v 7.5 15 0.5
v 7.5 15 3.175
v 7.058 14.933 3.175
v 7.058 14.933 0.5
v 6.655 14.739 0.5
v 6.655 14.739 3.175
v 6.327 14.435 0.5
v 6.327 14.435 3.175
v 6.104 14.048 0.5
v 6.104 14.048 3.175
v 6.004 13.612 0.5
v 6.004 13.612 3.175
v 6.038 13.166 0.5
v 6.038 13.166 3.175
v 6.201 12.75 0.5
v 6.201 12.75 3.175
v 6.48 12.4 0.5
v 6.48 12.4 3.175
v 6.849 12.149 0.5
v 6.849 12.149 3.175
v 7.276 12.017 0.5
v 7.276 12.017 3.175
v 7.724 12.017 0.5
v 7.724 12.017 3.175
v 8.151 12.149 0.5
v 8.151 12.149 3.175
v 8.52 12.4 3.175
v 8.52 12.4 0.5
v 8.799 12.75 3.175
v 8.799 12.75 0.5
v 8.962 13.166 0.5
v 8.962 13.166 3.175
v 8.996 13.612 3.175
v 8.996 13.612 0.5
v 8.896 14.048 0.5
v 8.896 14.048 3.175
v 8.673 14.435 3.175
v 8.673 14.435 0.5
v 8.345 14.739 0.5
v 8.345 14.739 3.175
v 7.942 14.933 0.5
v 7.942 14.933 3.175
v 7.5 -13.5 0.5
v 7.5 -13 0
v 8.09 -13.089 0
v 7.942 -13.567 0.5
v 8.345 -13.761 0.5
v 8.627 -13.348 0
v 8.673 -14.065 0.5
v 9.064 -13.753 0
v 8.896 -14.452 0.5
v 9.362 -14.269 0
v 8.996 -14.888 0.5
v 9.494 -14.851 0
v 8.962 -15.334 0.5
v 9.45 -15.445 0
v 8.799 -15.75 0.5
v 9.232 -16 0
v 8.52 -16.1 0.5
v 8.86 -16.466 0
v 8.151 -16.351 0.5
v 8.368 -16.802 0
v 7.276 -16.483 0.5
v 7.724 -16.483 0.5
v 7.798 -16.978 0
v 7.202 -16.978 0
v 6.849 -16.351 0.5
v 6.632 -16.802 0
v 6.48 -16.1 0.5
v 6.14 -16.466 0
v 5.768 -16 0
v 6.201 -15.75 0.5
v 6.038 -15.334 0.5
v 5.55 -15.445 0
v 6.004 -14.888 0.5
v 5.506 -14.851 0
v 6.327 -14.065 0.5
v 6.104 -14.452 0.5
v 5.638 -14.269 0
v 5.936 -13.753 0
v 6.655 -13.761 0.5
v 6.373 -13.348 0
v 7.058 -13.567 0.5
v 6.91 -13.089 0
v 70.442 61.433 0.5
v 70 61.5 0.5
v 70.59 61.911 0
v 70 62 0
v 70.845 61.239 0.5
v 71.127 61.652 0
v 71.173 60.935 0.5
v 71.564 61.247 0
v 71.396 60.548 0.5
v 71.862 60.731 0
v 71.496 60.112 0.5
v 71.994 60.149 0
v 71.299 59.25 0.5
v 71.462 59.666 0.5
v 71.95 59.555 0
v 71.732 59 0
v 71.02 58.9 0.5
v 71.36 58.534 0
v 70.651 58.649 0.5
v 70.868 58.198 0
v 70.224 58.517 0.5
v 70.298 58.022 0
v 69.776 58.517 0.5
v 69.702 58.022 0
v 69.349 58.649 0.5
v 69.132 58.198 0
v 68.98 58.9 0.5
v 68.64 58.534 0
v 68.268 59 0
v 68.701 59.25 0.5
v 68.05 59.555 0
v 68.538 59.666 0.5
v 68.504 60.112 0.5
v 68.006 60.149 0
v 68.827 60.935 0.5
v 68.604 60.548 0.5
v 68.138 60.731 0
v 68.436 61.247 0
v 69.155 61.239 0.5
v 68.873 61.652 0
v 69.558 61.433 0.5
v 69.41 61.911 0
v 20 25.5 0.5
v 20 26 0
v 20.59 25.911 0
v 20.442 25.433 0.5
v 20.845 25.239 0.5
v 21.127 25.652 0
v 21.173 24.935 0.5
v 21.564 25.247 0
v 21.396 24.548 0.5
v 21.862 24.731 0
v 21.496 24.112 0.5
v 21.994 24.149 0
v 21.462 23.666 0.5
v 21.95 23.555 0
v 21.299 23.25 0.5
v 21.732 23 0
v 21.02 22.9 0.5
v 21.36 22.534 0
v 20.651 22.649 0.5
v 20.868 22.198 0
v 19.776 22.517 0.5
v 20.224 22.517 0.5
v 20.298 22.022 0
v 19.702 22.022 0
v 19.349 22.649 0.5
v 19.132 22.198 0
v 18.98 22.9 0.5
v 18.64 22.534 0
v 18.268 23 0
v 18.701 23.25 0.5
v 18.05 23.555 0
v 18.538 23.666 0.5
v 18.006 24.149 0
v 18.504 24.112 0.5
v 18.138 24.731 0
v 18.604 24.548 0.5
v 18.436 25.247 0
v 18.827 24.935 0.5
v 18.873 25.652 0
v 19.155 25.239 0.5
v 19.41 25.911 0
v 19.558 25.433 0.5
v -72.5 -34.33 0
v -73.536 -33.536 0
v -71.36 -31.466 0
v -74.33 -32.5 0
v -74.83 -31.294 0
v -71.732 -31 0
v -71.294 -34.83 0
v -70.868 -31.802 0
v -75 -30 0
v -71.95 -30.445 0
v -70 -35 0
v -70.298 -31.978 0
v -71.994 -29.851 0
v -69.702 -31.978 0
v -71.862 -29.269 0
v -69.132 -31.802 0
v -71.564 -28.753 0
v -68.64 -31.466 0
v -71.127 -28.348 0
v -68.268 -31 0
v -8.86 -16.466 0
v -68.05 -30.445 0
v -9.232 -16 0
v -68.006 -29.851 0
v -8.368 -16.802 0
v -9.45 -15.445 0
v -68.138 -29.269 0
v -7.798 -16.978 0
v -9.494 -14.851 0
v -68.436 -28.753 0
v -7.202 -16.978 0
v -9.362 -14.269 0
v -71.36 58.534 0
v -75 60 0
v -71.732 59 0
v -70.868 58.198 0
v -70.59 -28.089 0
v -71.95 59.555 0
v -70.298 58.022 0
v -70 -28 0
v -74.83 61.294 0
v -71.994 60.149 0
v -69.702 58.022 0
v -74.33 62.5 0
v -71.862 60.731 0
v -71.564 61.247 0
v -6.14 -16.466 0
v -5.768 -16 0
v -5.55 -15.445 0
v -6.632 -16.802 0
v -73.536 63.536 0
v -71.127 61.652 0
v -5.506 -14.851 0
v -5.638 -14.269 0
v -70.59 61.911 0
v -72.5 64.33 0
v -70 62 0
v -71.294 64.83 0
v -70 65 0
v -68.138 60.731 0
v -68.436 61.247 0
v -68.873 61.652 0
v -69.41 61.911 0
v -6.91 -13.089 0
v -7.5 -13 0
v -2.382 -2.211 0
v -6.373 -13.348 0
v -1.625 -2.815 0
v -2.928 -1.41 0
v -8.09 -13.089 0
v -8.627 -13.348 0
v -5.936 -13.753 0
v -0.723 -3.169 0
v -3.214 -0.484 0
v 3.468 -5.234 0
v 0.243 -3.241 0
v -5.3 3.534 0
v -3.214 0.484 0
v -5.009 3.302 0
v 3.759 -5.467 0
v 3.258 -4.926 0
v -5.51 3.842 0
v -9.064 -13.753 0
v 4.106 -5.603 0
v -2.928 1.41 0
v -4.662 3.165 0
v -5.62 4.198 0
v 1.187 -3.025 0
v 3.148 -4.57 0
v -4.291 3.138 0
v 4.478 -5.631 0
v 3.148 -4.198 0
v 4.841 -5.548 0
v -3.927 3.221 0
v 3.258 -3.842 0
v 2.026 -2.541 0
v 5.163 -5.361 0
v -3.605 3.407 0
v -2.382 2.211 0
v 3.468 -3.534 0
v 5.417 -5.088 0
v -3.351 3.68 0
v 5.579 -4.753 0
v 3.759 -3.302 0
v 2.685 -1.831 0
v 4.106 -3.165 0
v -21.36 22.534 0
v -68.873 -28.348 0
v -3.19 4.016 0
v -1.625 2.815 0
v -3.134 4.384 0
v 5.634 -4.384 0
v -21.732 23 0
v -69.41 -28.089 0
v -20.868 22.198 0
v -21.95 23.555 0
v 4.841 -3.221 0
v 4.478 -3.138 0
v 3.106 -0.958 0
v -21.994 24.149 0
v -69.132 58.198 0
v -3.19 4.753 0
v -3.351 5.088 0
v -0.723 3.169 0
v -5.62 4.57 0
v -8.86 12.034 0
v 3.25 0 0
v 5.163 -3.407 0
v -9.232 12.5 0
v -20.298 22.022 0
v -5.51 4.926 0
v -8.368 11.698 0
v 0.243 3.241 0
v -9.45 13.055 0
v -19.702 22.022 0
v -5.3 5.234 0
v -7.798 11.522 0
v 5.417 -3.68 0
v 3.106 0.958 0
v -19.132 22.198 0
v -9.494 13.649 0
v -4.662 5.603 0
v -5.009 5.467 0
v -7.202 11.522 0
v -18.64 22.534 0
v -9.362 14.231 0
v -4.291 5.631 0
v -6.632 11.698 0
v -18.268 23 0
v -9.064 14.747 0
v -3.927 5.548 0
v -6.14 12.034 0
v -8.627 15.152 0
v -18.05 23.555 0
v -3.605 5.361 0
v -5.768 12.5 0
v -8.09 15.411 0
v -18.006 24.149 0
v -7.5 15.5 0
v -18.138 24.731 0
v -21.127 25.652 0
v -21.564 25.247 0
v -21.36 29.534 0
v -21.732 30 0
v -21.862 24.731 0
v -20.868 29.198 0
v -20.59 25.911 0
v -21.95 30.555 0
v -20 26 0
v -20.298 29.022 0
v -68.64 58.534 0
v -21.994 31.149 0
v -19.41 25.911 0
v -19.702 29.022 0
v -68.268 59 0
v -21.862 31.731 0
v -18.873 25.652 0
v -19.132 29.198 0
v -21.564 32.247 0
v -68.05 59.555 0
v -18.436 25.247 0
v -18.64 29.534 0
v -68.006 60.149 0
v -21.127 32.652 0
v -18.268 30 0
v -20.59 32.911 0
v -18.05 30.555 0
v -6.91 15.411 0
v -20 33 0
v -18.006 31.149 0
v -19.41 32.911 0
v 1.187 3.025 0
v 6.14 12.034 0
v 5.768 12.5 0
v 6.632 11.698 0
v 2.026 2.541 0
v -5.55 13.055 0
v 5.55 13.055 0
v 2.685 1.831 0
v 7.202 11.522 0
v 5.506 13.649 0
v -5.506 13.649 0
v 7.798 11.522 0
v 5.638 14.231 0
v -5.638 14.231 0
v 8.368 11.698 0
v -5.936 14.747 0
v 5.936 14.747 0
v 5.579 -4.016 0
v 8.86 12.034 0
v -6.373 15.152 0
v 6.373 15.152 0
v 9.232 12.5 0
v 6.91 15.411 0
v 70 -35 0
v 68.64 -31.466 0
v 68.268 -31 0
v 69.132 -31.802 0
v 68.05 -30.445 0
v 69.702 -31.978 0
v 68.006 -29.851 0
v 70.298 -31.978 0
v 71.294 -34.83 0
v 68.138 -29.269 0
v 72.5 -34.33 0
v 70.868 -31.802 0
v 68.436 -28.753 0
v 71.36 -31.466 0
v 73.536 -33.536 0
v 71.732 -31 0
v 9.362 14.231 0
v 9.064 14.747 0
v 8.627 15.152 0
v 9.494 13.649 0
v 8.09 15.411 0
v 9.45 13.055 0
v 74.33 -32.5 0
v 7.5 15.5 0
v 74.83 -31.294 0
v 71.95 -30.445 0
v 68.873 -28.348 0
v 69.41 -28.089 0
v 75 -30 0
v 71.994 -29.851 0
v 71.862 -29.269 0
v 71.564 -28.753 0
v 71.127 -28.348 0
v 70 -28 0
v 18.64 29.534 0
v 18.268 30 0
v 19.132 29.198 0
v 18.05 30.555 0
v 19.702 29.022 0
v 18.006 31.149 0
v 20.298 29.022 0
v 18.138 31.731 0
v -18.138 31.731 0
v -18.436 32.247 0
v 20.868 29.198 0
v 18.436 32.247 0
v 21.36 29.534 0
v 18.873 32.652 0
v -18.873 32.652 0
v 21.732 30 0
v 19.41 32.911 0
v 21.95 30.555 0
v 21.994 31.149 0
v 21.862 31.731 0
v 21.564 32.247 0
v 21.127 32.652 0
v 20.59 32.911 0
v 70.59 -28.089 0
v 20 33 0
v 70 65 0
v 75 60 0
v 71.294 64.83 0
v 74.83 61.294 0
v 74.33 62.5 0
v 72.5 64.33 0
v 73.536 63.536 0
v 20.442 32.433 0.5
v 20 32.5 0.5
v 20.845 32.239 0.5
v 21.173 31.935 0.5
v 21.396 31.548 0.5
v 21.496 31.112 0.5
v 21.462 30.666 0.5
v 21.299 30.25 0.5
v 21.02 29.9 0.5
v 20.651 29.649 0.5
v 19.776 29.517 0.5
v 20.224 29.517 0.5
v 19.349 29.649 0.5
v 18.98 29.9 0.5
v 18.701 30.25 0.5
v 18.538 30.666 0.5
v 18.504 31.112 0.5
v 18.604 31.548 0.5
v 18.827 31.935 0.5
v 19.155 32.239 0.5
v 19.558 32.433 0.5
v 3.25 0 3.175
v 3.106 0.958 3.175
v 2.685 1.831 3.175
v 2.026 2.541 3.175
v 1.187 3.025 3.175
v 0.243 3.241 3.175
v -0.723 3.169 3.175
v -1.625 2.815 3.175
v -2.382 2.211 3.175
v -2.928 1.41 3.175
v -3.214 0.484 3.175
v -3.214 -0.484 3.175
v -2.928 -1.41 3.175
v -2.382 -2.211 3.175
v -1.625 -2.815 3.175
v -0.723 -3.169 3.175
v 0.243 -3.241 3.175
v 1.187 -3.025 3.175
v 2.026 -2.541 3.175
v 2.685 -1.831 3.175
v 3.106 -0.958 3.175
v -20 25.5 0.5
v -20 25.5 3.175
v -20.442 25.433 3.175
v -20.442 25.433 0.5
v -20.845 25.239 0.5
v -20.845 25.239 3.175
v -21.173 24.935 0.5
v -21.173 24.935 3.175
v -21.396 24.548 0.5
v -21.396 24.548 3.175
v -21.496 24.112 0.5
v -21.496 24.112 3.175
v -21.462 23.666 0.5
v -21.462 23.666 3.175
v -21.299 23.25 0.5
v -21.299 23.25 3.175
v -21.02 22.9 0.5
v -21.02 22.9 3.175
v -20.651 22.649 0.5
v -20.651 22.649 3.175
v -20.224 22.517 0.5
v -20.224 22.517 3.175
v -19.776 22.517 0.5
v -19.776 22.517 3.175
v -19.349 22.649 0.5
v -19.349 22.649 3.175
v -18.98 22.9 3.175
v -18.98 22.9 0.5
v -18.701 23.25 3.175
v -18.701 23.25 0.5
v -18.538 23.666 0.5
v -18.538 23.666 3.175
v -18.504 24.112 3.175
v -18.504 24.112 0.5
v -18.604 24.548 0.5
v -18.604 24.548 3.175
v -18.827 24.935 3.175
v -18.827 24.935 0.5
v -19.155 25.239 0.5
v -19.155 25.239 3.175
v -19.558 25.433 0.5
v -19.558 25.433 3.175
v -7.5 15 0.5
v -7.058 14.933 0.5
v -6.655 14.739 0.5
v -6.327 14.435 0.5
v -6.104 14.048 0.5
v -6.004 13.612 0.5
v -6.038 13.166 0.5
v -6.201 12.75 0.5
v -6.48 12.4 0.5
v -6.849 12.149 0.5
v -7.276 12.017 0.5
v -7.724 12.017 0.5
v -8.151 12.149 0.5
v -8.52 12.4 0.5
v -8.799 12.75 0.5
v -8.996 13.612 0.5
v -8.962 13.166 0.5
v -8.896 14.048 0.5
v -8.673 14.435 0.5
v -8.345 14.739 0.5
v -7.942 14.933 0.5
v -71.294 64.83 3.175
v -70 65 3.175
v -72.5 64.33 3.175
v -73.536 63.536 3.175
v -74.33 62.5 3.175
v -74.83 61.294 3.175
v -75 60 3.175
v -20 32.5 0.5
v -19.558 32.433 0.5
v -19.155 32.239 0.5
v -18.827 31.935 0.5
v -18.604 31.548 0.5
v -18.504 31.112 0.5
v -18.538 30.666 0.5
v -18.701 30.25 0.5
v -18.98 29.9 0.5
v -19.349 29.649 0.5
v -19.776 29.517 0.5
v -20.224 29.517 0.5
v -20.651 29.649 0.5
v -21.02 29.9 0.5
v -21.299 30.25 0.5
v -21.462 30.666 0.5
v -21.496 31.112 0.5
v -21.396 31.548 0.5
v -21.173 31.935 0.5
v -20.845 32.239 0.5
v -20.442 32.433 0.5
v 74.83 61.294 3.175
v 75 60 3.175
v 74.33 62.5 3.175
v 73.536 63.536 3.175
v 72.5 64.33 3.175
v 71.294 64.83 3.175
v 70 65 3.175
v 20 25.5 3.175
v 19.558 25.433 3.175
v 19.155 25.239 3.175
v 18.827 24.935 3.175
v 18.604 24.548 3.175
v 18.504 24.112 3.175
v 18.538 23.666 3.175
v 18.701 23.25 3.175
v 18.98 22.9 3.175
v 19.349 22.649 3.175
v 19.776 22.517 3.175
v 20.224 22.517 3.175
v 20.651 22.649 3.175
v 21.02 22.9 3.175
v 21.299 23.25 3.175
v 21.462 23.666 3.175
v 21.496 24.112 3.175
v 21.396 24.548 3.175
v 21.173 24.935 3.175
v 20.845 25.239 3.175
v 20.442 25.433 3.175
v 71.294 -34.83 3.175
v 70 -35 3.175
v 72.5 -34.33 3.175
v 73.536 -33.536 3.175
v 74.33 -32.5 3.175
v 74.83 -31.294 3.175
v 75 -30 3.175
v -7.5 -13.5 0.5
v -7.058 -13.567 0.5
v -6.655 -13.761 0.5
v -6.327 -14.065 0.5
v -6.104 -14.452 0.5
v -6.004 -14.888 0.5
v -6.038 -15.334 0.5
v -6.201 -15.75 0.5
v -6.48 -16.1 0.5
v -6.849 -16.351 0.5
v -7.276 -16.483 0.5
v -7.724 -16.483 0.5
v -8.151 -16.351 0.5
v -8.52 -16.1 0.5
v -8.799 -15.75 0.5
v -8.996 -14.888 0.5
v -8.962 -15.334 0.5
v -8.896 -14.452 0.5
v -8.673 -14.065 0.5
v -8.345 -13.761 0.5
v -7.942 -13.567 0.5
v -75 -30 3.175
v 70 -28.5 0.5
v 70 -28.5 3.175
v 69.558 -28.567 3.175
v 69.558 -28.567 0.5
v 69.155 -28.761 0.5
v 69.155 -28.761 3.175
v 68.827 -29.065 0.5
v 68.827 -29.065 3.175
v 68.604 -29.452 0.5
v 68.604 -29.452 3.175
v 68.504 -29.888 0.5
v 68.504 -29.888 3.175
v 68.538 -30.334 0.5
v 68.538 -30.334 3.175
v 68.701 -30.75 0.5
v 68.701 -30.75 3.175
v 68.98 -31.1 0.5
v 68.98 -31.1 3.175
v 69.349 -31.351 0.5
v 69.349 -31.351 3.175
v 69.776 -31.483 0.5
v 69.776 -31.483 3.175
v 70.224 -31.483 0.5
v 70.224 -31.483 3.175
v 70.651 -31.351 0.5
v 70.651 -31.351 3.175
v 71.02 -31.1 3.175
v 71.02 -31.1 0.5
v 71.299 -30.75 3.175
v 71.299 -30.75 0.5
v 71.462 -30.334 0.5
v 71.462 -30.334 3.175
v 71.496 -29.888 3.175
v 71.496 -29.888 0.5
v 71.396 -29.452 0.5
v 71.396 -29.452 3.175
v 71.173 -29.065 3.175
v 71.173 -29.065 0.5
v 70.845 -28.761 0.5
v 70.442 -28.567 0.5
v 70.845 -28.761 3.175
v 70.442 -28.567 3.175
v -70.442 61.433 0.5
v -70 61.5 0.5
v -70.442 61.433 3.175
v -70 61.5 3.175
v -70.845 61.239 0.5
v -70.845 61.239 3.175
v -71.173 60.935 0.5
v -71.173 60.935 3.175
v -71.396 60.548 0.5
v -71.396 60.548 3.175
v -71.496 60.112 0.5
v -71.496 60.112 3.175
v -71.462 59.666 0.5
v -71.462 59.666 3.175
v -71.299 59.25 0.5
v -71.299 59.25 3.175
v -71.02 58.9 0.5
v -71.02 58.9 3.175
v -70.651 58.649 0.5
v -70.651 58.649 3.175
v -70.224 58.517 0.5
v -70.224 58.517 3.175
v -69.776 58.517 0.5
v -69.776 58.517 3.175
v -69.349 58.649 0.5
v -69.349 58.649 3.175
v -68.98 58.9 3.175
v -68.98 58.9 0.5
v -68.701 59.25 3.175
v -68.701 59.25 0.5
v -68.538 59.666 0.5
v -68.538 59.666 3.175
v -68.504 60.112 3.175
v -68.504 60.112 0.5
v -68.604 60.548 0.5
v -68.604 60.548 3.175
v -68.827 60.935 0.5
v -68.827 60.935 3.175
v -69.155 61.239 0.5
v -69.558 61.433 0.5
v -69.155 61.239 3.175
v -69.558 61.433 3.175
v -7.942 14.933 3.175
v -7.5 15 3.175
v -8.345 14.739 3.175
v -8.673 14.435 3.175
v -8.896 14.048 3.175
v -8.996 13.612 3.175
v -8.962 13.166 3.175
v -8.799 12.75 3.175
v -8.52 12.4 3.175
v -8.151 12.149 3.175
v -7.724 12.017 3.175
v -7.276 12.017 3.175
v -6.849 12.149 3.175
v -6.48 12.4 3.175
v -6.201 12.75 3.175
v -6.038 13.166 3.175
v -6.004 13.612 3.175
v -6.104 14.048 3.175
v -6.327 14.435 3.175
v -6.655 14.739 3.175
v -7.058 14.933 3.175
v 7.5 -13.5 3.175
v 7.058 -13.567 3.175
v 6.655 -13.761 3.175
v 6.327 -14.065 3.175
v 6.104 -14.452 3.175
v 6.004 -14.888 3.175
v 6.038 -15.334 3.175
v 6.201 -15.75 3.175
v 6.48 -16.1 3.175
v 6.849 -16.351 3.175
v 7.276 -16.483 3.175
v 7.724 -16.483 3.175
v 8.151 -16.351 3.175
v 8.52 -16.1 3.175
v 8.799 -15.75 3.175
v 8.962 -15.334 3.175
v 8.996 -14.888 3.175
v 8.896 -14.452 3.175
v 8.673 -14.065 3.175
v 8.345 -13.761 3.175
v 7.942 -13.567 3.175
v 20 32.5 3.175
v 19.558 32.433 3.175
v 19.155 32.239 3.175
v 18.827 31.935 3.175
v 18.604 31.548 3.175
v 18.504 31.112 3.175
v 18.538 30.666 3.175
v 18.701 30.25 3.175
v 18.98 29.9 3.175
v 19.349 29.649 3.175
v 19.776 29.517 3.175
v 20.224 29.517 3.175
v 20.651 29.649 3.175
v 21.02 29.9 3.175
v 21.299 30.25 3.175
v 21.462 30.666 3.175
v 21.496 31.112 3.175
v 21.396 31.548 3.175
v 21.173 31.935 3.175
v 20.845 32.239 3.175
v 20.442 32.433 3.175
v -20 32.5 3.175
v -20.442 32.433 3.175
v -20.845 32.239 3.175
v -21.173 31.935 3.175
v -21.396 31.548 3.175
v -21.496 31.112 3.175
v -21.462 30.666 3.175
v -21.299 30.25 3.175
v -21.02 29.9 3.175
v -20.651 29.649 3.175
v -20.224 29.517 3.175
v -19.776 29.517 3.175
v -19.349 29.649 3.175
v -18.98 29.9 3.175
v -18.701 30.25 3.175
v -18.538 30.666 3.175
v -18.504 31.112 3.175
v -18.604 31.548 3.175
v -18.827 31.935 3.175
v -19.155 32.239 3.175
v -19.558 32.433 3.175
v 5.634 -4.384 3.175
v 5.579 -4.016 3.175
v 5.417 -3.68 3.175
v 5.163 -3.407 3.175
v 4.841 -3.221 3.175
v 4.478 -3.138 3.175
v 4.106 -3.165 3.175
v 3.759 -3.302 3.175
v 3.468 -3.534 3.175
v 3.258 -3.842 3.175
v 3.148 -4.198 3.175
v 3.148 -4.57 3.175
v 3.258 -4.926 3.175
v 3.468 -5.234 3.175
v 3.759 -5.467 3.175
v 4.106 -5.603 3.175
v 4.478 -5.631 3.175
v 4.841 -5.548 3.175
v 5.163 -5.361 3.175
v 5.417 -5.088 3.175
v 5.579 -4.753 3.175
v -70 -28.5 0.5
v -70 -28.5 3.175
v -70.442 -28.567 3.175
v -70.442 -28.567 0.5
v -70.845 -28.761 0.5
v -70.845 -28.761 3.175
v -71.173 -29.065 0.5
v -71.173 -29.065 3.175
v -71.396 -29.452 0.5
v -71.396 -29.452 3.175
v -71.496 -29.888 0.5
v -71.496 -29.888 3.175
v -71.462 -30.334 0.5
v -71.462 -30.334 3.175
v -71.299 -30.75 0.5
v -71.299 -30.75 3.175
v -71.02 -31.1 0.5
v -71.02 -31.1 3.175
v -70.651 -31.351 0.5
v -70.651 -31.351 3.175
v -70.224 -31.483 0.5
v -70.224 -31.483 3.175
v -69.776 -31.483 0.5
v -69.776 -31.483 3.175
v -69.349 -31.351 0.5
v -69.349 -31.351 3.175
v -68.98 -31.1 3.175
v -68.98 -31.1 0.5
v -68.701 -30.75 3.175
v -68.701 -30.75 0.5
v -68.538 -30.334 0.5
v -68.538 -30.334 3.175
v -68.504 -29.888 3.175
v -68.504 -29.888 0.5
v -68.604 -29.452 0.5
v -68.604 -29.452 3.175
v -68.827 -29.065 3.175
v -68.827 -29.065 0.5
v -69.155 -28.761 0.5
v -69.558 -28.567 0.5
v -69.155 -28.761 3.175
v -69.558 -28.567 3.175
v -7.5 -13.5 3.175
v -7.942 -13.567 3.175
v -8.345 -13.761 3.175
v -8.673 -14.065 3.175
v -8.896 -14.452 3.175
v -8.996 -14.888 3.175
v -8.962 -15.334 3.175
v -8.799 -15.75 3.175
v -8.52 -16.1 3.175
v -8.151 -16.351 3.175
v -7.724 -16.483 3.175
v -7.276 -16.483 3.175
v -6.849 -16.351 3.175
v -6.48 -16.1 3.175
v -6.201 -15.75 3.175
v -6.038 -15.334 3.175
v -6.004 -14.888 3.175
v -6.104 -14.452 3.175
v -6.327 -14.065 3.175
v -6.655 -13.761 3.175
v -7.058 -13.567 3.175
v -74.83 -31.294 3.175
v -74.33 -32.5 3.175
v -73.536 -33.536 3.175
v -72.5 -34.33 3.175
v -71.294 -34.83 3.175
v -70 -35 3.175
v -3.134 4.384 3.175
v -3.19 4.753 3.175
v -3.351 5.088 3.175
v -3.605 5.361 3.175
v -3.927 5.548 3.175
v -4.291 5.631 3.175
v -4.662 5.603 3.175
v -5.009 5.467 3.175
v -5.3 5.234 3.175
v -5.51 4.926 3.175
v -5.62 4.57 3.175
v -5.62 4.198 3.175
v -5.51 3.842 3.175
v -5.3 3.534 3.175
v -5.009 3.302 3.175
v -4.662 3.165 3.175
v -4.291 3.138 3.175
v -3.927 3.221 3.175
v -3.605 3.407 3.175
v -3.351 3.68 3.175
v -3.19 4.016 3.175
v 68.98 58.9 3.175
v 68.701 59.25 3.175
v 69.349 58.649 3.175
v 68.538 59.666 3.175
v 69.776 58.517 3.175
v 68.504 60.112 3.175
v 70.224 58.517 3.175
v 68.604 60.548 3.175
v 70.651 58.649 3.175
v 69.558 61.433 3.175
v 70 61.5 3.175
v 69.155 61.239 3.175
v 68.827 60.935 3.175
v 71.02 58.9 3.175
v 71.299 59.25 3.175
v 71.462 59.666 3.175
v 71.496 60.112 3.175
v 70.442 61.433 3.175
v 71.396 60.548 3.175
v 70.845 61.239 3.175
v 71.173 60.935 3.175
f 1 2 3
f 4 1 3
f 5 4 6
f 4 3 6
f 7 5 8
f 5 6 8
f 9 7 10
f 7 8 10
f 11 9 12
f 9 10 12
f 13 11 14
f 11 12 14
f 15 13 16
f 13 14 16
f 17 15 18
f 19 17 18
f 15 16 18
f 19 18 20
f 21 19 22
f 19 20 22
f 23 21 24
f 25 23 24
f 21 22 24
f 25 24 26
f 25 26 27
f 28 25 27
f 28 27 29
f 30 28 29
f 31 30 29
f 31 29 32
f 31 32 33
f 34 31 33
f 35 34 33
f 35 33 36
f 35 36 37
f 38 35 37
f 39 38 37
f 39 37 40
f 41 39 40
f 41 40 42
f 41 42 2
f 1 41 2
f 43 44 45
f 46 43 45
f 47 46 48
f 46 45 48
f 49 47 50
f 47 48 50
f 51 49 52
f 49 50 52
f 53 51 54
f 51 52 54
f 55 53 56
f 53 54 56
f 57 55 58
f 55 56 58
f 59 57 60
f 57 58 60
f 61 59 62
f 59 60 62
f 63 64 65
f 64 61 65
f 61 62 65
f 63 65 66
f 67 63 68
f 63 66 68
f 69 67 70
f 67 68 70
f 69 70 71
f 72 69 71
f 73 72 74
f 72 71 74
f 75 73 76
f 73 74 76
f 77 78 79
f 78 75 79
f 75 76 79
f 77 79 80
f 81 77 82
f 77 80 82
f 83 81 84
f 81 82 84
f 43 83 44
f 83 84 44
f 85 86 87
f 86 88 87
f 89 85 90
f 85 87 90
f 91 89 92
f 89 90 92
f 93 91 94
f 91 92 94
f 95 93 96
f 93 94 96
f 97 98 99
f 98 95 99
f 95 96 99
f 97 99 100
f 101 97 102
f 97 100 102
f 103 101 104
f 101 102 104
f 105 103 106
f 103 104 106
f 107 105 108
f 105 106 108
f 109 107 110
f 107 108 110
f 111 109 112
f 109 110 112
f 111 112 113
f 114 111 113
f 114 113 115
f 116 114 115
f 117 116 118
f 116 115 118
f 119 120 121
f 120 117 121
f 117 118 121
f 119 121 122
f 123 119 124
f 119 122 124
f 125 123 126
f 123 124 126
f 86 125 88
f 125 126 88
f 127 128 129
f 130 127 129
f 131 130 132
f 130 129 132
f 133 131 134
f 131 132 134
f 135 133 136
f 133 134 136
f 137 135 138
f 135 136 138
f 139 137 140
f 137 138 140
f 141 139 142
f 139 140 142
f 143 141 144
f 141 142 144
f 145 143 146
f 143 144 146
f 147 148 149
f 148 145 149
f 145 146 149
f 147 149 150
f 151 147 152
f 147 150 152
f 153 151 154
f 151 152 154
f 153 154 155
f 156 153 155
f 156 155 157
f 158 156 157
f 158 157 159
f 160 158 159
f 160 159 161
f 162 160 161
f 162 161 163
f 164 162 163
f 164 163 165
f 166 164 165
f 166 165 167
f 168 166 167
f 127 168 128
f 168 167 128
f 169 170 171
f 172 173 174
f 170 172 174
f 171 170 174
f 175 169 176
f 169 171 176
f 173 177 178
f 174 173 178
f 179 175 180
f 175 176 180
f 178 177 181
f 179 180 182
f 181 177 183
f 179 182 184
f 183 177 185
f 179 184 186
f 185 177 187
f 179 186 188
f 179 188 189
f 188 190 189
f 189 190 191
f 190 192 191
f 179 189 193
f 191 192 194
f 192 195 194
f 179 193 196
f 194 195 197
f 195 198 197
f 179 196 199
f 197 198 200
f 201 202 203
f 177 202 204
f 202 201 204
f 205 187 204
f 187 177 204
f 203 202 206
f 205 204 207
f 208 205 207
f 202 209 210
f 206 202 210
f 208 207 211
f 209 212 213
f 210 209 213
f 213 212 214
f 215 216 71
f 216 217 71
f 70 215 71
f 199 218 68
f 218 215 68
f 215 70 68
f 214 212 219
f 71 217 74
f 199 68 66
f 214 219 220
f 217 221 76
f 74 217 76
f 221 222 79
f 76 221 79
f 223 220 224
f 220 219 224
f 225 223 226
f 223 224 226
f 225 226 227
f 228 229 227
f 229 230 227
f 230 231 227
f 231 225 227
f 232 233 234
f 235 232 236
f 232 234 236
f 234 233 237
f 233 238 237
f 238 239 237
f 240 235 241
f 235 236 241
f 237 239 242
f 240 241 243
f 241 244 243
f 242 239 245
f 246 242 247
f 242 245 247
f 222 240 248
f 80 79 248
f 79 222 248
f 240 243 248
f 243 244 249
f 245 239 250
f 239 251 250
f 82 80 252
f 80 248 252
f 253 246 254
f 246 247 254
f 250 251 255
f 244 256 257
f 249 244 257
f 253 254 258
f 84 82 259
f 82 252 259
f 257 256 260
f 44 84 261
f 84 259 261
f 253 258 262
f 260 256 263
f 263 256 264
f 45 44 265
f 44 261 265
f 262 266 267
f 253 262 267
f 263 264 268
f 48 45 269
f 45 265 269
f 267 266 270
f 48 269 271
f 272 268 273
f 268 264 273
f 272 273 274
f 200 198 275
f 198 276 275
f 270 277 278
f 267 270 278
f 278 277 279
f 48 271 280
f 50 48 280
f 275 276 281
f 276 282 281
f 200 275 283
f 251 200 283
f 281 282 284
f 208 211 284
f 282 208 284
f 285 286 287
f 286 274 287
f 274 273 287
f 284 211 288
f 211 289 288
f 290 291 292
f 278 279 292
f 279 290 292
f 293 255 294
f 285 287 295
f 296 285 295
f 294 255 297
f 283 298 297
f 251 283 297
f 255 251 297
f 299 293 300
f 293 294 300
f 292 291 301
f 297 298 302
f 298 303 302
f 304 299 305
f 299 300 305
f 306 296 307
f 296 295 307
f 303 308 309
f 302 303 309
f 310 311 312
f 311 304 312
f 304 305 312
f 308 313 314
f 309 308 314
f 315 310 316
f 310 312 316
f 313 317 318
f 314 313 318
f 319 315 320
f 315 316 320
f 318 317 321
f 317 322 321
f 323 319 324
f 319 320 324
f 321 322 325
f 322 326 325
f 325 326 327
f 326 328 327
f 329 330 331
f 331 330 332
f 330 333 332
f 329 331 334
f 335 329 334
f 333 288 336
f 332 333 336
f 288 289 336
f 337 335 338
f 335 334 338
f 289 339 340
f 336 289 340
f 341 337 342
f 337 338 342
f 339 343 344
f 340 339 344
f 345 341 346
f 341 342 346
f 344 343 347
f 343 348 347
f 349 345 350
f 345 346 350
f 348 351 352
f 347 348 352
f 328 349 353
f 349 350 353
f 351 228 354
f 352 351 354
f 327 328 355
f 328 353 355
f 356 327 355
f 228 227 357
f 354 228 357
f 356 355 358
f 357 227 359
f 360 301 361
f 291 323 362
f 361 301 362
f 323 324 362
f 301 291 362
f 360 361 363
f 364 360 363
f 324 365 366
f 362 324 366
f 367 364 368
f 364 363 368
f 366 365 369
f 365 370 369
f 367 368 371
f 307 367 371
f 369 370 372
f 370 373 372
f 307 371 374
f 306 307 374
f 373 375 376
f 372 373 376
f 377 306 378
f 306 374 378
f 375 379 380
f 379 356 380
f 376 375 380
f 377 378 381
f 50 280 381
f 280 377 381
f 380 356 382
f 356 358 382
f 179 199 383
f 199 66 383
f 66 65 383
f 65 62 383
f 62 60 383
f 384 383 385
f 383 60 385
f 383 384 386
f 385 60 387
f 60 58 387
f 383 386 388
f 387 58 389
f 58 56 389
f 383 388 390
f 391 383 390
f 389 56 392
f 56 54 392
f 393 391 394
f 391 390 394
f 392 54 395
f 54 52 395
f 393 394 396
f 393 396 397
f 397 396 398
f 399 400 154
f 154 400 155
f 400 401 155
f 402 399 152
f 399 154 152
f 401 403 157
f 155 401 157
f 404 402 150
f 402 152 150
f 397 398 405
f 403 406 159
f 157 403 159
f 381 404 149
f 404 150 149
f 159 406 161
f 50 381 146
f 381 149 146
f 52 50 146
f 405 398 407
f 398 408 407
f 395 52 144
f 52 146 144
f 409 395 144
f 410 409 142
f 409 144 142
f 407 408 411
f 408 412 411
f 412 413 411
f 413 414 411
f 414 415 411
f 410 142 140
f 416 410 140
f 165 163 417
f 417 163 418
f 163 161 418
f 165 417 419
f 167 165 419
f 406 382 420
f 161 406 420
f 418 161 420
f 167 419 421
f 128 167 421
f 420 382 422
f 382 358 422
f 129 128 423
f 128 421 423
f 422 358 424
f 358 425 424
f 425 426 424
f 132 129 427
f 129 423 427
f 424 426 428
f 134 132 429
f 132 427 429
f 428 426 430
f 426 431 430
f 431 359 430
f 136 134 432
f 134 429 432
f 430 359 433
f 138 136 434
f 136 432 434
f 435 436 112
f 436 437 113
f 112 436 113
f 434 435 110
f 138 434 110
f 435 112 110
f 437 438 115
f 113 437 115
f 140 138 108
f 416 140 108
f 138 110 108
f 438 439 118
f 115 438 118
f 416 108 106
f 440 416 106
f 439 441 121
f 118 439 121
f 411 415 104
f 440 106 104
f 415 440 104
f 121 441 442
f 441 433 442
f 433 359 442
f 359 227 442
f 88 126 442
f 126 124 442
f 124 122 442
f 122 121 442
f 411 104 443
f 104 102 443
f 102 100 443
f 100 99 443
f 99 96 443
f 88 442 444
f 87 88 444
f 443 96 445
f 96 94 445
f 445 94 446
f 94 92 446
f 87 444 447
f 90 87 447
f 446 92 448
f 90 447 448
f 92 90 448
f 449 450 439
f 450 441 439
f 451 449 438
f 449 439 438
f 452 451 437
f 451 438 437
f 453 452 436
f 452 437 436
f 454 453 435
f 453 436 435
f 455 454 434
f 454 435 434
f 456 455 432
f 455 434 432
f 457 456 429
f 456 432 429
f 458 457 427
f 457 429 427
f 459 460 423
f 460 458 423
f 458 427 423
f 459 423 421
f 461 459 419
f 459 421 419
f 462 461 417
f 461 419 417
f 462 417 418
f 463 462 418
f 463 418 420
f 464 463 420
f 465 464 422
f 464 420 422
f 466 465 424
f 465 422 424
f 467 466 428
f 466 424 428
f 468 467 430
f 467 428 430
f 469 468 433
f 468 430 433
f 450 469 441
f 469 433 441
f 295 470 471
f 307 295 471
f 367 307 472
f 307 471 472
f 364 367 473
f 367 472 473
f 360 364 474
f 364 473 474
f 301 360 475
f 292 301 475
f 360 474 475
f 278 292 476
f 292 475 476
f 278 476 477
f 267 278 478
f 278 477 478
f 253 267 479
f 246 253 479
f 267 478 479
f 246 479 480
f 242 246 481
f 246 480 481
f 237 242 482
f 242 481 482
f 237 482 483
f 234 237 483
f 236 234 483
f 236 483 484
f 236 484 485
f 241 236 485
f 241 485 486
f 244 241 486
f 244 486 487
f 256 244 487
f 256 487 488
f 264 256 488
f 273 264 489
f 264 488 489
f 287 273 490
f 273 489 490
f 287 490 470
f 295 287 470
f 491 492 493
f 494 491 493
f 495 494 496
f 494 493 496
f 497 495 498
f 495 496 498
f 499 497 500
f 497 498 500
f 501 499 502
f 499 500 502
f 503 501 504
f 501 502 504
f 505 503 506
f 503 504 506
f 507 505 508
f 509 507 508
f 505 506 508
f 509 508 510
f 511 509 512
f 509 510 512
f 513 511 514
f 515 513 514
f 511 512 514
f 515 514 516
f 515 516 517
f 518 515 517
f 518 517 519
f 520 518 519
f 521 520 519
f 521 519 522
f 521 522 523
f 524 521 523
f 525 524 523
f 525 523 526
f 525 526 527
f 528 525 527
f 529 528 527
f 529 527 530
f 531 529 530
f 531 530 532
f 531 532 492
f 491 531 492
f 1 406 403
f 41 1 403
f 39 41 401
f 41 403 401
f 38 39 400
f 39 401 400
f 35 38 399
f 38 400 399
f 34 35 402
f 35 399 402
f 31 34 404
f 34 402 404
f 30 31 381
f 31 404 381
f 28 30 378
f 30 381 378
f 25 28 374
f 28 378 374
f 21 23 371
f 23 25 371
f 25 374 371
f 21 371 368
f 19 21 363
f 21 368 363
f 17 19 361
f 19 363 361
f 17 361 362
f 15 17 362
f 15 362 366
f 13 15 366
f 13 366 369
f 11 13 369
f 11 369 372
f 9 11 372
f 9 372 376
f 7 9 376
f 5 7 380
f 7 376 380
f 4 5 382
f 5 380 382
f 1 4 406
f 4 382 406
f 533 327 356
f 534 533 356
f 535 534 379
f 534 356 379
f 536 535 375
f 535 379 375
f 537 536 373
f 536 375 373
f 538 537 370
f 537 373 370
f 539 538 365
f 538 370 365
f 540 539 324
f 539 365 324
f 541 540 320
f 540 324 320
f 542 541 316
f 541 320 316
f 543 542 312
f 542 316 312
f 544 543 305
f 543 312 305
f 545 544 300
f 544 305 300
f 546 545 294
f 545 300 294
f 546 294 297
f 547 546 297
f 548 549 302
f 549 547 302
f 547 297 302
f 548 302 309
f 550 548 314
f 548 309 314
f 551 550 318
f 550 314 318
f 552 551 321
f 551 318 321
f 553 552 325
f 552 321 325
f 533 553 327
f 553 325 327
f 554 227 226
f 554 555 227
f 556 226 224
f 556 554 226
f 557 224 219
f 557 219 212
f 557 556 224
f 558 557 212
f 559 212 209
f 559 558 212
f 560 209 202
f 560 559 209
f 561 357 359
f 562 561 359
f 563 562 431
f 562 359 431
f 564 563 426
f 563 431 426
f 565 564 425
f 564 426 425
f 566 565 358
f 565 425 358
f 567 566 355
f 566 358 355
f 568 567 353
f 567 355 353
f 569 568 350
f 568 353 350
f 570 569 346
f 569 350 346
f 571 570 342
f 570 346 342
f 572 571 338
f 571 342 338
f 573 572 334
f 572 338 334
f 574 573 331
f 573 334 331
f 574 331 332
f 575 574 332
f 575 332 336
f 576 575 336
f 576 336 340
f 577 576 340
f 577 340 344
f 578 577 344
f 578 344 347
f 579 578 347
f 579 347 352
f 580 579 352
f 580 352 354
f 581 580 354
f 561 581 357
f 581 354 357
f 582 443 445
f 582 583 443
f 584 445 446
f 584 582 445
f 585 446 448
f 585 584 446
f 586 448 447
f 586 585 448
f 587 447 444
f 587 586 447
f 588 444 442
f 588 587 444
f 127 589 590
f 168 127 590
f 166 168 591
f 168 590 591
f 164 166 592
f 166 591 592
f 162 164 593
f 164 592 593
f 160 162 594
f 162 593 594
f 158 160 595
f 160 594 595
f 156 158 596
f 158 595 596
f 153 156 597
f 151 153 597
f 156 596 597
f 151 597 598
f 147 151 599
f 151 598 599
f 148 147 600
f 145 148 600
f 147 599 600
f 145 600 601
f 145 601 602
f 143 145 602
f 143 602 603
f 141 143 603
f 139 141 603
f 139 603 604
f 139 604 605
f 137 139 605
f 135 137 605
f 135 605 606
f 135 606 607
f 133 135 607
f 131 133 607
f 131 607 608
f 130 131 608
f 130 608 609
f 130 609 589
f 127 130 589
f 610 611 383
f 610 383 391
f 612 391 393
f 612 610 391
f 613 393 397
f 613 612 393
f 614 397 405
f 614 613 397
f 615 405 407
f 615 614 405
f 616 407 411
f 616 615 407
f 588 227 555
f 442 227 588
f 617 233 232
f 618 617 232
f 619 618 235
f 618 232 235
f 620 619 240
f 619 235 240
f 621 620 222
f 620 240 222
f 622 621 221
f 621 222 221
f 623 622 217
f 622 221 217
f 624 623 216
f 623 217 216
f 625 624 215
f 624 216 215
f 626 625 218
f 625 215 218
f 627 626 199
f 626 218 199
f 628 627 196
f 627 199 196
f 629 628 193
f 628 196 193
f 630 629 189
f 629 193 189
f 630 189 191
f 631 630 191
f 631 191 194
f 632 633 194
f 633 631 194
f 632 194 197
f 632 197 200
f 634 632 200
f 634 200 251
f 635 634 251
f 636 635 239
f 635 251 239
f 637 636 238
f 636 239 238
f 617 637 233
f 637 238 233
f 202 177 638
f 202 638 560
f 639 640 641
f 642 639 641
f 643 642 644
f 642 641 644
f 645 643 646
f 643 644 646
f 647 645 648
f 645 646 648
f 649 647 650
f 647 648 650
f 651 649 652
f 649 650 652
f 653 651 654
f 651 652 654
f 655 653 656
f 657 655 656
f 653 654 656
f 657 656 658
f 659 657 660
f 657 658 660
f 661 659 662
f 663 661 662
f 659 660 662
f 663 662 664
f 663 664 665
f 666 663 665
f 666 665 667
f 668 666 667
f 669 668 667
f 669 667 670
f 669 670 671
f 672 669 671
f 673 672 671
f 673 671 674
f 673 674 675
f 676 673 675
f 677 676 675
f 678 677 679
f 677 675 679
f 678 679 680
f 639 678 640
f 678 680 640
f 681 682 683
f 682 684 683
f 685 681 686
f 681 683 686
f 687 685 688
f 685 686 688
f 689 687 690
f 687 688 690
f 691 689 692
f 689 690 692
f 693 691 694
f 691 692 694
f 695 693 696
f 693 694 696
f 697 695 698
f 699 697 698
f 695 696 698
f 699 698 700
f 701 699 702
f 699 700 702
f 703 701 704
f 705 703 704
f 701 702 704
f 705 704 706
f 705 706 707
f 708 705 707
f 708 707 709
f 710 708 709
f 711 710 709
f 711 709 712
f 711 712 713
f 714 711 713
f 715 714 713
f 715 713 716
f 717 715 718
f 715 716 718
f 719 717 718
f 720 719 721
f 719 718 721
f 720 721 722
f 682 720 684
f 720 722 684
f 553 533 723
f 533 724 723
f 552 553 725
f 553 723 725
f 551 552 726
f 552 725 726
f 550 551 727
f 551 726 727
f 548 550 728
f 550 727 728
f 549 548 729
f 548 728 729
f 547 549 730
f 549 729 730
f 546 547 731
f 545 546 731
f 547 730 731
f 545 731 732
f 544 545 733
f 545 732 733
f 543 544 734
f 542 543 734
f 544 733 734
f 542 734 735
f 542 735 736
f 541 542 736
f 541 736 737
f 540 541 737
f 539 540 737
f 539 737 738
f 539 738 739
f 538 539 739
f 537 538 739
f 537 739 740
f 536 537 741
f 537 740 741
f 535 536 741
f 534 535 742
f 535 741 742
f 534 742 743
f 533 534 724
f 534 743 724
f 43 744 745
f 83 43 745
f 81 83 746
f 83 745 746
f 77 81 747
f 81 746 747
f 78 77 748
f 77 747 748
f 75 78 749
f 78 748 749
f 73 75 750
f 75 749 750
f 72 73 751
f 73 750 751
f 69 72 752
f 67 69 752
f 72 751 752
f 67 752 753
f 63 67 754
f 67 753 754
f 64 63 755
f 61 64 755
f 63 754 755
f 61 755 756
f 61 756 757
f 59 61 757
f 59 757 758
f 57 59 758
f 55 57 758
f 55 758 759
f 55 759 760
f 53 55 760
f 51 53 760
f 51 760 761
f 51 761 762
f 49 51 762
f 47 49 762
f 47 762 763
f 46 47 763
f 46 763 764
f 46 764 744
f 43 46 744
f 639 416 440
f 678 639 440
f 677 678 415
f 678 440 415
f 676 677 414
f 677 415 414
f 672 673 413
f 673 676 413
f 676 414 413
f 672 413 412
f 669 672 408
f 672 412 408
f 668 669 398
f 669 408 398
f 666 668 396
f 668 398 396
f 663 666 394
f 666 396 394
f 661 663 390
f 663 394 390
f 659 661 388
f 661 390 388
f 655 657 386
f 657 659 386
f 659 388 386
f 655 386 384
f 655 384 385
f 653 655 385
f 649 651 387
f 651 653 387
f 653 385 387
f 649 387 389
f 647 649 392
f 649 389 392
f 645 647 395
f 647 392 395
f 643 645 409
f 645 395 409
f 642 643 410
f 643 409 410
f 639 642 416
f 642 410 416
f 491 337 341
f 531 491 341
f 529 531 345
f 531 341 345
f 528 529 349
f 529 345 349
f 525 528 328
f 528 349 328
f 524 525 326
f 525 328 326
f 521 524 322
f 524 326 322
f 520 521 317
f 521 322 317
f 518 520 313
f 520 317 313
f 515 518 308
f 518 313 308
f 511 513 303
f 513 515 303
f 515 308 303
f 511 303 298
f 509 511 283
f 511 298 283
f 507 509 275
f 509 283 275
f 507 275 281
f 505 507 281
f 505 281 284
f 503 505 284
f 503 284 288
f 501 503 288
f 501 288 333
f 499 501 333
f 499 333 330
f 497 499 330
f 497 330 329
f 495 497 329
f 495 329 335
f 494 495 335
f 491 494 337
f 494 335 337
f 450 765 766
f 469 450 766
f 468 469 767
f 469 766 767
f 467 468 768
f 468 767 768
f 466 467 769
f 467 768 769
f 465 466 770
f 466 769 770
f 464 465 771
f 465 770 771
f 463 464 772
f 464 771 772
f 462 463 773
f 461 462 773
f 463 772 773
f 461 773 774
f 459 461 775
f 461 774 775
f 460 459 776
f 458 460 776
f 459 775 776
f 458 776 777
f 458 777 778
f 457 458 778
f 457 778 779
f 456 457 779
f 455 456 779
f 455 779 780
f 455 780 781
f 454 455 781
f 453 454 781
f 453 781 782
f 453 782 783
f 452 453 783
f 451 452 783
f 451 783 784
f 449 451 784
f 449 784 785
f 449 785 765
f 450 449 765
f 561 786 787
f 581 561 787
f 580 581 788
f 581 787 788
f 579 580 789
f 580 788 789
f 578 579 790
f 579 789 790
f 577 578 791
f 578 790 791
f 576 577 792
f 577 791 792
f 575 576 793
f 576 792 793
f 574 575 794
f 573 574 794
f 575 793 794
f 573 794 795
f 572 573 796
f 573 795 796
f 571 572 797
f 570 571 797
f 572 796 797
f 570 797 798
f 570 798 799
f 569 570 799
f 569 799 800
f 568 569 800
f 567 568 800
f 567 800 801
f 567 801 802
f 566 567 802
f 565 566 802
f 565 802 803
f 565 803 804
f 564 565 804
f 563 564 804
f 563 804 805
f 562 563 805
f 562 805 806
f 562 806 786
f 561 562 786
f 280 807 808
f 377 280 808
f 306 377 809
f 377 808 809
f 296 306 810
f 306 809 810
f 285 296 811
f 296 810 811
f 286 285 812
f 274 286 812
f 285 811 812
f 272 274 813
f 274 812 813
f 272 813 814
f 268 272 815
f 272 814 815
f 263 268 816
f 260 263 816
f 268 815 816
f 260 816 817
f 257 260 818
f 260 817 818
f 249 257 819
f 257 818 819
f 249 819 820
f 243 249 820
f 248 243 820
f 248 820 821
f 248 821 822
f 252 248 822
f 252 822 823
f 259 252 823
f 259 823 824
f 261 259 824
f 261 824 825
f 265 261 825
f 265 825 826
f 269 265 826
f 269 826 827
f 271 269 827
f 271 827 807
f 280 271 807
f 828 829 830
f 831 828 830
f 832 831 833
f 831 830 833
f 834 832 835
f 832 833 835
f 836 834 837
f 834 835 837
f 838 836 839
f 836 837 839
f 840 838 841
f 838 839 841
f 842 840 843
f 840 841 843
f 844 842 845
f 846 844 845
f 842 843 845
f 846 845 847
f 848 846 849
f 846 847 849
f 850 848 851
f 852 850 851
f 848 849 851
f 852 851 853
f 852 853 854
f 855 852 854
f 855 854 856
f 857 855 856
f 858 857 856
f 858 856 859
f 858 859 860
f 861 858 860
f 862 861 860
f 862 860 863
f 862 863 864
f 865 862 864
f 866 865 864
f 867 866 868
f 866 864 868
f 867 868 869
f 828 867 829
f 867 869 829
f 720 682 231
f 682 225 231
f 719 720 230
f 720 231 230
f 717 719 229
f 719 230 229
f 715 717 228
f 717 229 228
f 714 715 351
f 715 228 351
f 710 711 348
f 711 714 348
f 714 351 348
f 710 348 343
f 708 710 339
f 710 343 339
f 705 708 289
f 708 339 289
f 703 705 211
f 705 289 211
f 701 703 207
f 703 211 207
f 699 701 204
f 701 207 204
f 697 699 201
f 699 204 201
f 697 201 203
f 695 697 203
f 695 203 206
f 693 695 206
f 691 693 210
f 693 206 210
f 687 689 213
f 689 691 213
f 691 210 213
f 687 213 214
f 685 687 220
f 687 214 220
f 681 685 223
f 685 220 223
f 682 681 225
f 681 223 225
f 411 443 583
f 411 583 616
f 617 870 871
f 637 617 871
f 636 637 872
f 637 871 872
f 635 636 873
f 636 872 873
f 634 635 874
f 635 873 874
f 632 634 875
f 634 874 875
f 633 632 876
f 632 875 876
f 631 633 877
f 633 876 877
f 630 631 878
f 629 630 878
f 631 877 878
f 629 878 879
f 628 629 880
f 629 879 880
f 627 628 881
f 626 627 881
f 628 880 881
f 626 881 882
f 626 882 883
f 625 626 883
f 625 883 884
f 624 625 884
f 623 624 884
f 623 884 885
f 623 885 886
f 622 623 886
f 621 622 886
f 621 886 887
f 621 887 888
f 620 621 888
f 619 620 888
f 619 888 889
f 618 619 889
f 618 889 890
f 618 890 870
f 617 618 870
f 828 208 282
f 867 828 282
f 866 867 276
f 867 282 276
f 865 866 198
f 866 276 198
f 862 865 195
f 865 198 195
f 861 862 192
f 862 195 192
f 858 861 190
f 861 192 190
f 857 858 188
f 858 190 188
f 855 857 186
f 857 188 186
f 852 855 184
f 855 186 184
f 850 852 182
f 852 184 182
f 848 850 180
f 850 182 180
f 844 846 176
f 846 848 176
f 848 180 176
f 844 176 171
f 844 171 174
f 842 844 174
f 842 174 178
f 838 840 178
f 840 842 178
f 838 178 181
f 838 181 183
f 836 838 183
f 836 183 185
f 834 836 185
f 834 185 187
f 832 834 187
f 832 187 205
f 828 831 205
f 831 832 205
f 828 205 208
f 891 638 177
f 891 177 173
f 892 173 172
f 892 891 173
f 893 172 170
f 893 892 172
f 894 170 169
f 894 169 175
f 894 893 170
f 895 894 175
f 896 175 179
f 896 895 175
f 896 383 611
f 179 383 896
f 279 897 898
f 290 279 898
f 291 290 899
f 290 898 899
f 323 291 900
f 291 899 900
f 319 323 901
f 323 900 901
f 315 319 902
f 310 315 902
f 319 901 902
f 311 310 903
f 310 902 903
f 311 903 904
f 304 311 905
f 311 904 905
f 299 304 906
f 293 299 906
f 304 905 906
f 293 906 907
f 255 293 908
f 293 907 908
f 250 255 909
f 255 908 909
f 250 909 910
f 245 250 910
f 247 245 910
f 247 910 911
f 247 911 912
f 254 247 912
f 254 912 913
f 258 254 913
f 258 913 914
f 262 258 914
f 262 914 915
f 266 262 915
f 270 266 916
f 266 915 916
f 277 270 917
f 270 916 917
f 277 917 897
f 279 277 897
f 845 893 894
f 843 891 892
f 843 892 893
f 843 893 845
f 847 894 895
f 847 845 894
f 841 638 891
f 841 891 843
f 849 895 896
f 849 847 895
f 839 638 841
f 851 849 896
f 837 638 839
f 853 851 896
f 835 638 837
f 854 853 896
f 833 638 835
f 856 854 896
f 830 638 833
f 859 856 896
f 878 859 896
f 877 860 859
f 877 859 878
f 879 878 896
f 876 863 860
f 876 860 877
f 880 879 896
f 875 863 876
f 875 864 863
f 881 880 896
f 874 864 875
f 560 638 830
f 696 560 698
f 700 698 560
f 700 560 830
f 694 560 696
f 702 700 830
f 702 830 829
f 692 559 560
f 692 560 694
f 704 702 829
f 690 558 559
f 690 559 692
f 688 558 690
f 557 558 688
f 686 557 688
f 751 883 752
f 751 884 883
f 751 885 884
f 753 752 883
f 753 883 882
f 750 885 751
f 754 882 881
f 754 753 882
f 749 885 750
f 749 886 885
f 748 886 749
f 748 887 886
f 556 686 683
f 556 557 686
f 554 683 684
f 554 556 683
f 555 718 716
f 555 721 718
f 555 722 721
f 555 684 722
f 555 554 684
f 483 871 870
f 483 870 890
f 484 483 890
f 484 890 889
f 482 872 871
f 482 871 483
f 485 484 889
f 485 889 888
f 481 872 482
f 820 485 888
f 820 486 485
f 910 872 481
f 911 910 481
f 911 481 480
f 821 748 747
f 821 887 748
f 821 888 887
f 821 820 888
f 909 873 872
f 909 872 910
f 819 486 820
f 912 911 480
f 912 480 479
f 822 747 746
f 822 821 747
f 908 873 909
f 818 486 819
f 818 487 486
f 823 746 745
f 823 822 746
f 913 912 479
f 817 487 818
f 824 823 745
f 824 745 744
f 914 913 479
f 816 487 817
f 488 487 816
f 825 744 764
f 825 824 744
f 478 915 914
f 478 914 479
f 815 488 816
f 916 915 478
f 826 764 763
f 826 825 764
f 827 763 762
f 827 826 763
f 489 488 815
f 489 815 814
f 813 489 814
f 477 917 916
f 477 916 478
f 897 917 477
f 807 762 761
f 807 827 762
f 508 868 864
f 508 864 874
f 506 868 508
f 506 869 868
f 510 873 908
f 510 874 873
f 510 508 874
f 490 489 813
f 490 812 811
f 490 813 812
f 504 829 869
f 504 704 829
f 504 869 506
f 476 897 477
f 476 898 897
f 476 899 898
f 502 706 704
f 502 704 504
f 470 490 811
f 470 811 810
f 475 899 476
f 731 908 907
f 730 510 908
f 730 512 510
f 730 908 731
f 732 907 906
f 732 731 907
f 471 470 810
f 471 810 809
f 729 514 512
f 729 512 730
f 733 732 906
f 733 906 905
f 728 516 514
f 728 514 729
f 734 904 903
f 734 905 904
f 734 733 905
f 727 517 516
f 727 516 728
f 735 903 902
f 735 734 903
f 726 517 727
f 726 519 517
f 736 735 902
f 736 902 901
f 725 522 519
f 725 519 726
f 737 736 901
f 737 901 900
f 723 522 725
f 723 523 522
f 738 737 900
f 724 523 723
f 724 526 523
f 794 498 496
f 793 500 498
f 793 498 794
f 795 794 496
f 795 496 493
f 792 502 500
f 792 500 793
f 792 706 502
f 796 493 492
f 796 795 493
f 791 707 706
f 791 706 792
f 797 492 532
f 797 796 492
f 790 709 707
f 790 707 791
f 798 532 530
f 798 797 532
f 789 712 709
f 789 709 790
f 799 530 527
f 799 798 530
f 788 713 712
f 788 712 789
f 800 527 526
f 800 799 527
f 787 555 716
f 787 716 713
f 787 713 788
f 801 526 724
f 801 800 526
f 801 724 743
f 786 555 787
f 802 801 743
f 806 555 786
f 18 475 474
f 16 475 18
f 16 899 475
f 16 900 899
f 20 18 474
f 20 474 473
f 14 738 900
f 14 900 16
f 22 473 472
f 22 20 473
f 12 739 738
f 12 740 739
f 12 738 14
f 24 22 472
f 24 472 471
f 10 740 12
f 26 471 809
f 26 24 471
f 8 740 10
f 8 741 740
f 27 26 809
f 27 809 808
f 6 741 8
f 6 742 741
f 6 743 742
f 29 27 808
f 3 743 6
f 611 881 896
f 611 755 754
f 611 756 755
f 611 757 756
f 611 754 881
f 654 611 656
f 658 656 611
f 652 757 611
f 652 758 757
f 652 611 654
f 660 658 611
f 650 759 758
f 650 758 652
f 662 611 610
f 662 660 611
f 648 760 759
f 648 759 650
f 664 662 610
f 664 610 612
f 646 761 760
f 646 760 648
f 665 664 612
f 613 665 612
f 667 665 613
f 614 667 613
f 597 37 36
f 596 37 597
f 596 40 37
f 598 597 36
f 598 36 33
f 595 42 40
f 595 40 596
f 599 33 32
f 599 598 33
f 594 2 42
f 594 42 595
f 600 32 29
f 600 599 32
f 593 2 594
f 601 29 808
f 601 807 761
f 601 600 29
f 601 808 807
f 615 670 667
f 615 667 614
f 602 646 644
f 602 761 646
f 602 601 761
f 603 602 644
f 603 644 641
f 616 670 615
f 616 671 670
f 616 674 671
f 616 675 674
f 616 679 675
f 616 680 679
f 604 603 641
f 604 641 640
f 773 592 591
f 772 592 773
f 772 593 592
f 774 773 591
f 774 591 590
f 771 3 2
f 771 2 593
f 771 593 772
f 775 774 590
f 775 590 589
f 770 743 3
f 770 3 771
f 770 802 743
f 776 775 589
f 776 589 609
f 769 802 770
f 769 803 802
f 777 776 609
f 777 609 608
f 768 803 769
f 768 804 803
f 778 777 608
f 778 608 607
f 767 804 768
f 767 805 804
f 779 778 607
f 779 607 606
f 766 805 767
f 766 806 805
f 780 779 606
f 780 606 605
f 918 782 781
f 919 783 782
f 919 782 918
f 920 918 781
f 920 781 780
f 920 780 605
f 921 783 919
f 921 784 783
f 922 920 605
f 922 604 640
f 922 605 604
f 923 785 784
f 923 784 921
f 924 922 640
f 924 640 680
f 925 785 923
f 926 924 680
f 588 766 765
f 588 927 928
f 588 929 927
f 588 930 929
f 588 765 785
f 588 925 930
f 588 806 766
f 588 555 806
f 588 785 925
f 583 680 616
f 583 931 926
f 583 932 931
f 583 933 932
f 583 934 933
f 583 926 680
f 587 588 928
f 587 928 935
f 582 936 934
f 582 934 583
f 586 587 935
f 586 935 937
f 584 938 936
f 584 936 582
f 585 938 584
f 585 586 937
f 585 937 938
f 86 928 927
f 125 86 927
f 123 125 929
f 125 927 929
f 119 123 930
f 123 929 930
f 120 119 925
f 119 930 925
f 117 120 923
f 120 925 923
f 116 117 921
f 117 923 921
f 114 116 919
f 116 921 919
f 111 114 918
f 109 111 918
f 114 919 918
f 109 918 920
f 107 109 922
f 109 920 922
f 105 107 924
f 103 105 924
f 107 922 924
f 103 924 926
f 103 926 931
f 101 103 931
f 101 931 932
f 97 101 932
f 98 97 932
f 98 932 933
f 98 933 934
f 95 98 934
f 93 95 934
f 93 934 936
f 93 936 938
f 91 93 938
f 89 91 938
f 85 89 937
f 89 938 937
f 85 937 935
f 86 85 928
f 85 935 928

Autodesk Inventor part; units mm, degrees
ref_plane "YZ Plane" through (0, 0, 0) normal (1, 0, 0) x (0, 1, 0)
ref_plane "XZ Plane" through (0, 0, 0) normal (0, 1, 0) x (-1, 0, 0)
ref_plane "XY Plane" through (0, 0, 0) normal (0, 0, 1) x (1, 0, 0)
sketch "Sketch1" plane through (0, 0, 0) normal (0, 0, 1) x (1, 0, 0)
  line L0 (-75, 65) -> (75, 65)
  line L1 (75, 65) -> (75, -35)
  line L2 (75, -35) -> (-75, -35)
  line L3 (-75, -35) -> (-75, 65)
  point P0 (0, 0)
  dimension "d0" = 150
  dimension "d1" = 100
  dimension "d29" = 65
  dimension "d30" = 75
extrude "Extrusion1" add sketch "Sketch1" along normal blind 3.175
sketch "Sketch2" plane through (0, 0, 0) normal (0, 0, 1) x (1, 0, 0)
  line L0 (75, 65) -> (-75, 65) projected
  line L1 (-75, 65) -> (-75, -35) projected
  line L2 (75, -35) -> (75, 65) projected
  line L3 (-75, -35) -> (75, -35) projected
  point P0 (0, 0)
  point P1 (-70, 60)
  point P2 (70, 60)
  point P3 (70, -30)
  point P4 (-70, -30)
  dimension "d4" = 5
  dimension "d5" = 5
  dimension "d6" = 5
  dimension "d7" = 5
  dimension "d8" = 5
  dimension "d9" = 5
  dimension "d10" = 5
  dimension "d11" = 5
hole "Hole1" at (-70, 60, 0) at (70, 60, 0) at (70, -30, 0) at (-70, -30, 0) direction (0, 0, 1) diameter 3 end through all countersink diameter 4 countersink angle 90
fillet "Fillet1" radius 5 4 edges at (-75, 65, 1.5875) (75, 65, 1.5875) (75, -35, 1.5875) (-75, -35, 1.5875)
sketch "Sketch3" plane through (0, 0, 3.175) normal (0, 0, 1) x (1, 0, 0)
  circle A0 centre (0, 0) radius 3.25
  circle A1 centre (4.3841, -4.3841) radius 1.25
  circle A2 centre (-4.3841, 4.3841) radius 1.25
  dimension "d20" = 2.5
  dimension "d21" = 2.5
  dimension "d22" = 6.5
  dimension "d25" = 8.7681
  dimension "d26" = 8.7681
  dimension "d27" = 4.3841
  dimension "d28" = 4.3841
extrude "Extrusion2" cut sketch "Sketch3" against normal up to next
sketch "Sketch4" plane through (0, 0, 0) normal (0, 0, -1) x (-1, 0, 0)
  point P0 (0, 0)
  point P1 (-7.5, 13.5)
  point P2 (7.5, 13.5)
  point P3 (7.5, -15)
  point P4 (-7.5, -15)
  dimension "d33" = 15
  dimension "d34" = 15
  dimension "d35" = 13.5
  dimension "d36" = 15
  dimension "d37" = 7.5
  dimension "d38" = 15
  dimension "d39" = 7.5
  dimension "d40" = 13.5
hole "Hole2" at (7.5, 13.5, 0) at (-7.5, 13.5, 0) at (-7.5, -15, 0) at (7.5, -15, 0) direction (0, 0, 1) diameter 3 end through all countersink diameter 4 countersink angle 90
sketch "Sketch5" plane through (0, 0, 0) normal (0, 0, -1) x (-1, 0, 0)
  line L0 (70, 65) -> (-70, 65) projected
  line L1 (-75, 60) -> (-75, -30) projected
  line L2 (75, -30) -> (75, 60) projected
  point P0 (0, 0)
  point P1 (-20, 24)
  point P2 (-20, 31)
  point P3 (20, 31)
  point P4 (20, 24)
  dimension "d48" = 0
  dimension "d49" = 0
  dimension "d50" = 34
  dimension "d51" = 34
  dimension "d52" = 7
  dimension "d53" = 7
  dimension "d54" = 55
  dimension "d55" = 55
hole "Hole3" at (20, 24, 0) at (20, 31, 0) at (-20, 31, 0) at (-20, 24, 0) direction (0, 0, 1) diameter 3 end through all countersink diameter 4 countersink angle 90
equation "\"d37\" = 0.5 * d33"
equation "\"d39\" = 0.5 * d33"
properties part number "SheetPot"
